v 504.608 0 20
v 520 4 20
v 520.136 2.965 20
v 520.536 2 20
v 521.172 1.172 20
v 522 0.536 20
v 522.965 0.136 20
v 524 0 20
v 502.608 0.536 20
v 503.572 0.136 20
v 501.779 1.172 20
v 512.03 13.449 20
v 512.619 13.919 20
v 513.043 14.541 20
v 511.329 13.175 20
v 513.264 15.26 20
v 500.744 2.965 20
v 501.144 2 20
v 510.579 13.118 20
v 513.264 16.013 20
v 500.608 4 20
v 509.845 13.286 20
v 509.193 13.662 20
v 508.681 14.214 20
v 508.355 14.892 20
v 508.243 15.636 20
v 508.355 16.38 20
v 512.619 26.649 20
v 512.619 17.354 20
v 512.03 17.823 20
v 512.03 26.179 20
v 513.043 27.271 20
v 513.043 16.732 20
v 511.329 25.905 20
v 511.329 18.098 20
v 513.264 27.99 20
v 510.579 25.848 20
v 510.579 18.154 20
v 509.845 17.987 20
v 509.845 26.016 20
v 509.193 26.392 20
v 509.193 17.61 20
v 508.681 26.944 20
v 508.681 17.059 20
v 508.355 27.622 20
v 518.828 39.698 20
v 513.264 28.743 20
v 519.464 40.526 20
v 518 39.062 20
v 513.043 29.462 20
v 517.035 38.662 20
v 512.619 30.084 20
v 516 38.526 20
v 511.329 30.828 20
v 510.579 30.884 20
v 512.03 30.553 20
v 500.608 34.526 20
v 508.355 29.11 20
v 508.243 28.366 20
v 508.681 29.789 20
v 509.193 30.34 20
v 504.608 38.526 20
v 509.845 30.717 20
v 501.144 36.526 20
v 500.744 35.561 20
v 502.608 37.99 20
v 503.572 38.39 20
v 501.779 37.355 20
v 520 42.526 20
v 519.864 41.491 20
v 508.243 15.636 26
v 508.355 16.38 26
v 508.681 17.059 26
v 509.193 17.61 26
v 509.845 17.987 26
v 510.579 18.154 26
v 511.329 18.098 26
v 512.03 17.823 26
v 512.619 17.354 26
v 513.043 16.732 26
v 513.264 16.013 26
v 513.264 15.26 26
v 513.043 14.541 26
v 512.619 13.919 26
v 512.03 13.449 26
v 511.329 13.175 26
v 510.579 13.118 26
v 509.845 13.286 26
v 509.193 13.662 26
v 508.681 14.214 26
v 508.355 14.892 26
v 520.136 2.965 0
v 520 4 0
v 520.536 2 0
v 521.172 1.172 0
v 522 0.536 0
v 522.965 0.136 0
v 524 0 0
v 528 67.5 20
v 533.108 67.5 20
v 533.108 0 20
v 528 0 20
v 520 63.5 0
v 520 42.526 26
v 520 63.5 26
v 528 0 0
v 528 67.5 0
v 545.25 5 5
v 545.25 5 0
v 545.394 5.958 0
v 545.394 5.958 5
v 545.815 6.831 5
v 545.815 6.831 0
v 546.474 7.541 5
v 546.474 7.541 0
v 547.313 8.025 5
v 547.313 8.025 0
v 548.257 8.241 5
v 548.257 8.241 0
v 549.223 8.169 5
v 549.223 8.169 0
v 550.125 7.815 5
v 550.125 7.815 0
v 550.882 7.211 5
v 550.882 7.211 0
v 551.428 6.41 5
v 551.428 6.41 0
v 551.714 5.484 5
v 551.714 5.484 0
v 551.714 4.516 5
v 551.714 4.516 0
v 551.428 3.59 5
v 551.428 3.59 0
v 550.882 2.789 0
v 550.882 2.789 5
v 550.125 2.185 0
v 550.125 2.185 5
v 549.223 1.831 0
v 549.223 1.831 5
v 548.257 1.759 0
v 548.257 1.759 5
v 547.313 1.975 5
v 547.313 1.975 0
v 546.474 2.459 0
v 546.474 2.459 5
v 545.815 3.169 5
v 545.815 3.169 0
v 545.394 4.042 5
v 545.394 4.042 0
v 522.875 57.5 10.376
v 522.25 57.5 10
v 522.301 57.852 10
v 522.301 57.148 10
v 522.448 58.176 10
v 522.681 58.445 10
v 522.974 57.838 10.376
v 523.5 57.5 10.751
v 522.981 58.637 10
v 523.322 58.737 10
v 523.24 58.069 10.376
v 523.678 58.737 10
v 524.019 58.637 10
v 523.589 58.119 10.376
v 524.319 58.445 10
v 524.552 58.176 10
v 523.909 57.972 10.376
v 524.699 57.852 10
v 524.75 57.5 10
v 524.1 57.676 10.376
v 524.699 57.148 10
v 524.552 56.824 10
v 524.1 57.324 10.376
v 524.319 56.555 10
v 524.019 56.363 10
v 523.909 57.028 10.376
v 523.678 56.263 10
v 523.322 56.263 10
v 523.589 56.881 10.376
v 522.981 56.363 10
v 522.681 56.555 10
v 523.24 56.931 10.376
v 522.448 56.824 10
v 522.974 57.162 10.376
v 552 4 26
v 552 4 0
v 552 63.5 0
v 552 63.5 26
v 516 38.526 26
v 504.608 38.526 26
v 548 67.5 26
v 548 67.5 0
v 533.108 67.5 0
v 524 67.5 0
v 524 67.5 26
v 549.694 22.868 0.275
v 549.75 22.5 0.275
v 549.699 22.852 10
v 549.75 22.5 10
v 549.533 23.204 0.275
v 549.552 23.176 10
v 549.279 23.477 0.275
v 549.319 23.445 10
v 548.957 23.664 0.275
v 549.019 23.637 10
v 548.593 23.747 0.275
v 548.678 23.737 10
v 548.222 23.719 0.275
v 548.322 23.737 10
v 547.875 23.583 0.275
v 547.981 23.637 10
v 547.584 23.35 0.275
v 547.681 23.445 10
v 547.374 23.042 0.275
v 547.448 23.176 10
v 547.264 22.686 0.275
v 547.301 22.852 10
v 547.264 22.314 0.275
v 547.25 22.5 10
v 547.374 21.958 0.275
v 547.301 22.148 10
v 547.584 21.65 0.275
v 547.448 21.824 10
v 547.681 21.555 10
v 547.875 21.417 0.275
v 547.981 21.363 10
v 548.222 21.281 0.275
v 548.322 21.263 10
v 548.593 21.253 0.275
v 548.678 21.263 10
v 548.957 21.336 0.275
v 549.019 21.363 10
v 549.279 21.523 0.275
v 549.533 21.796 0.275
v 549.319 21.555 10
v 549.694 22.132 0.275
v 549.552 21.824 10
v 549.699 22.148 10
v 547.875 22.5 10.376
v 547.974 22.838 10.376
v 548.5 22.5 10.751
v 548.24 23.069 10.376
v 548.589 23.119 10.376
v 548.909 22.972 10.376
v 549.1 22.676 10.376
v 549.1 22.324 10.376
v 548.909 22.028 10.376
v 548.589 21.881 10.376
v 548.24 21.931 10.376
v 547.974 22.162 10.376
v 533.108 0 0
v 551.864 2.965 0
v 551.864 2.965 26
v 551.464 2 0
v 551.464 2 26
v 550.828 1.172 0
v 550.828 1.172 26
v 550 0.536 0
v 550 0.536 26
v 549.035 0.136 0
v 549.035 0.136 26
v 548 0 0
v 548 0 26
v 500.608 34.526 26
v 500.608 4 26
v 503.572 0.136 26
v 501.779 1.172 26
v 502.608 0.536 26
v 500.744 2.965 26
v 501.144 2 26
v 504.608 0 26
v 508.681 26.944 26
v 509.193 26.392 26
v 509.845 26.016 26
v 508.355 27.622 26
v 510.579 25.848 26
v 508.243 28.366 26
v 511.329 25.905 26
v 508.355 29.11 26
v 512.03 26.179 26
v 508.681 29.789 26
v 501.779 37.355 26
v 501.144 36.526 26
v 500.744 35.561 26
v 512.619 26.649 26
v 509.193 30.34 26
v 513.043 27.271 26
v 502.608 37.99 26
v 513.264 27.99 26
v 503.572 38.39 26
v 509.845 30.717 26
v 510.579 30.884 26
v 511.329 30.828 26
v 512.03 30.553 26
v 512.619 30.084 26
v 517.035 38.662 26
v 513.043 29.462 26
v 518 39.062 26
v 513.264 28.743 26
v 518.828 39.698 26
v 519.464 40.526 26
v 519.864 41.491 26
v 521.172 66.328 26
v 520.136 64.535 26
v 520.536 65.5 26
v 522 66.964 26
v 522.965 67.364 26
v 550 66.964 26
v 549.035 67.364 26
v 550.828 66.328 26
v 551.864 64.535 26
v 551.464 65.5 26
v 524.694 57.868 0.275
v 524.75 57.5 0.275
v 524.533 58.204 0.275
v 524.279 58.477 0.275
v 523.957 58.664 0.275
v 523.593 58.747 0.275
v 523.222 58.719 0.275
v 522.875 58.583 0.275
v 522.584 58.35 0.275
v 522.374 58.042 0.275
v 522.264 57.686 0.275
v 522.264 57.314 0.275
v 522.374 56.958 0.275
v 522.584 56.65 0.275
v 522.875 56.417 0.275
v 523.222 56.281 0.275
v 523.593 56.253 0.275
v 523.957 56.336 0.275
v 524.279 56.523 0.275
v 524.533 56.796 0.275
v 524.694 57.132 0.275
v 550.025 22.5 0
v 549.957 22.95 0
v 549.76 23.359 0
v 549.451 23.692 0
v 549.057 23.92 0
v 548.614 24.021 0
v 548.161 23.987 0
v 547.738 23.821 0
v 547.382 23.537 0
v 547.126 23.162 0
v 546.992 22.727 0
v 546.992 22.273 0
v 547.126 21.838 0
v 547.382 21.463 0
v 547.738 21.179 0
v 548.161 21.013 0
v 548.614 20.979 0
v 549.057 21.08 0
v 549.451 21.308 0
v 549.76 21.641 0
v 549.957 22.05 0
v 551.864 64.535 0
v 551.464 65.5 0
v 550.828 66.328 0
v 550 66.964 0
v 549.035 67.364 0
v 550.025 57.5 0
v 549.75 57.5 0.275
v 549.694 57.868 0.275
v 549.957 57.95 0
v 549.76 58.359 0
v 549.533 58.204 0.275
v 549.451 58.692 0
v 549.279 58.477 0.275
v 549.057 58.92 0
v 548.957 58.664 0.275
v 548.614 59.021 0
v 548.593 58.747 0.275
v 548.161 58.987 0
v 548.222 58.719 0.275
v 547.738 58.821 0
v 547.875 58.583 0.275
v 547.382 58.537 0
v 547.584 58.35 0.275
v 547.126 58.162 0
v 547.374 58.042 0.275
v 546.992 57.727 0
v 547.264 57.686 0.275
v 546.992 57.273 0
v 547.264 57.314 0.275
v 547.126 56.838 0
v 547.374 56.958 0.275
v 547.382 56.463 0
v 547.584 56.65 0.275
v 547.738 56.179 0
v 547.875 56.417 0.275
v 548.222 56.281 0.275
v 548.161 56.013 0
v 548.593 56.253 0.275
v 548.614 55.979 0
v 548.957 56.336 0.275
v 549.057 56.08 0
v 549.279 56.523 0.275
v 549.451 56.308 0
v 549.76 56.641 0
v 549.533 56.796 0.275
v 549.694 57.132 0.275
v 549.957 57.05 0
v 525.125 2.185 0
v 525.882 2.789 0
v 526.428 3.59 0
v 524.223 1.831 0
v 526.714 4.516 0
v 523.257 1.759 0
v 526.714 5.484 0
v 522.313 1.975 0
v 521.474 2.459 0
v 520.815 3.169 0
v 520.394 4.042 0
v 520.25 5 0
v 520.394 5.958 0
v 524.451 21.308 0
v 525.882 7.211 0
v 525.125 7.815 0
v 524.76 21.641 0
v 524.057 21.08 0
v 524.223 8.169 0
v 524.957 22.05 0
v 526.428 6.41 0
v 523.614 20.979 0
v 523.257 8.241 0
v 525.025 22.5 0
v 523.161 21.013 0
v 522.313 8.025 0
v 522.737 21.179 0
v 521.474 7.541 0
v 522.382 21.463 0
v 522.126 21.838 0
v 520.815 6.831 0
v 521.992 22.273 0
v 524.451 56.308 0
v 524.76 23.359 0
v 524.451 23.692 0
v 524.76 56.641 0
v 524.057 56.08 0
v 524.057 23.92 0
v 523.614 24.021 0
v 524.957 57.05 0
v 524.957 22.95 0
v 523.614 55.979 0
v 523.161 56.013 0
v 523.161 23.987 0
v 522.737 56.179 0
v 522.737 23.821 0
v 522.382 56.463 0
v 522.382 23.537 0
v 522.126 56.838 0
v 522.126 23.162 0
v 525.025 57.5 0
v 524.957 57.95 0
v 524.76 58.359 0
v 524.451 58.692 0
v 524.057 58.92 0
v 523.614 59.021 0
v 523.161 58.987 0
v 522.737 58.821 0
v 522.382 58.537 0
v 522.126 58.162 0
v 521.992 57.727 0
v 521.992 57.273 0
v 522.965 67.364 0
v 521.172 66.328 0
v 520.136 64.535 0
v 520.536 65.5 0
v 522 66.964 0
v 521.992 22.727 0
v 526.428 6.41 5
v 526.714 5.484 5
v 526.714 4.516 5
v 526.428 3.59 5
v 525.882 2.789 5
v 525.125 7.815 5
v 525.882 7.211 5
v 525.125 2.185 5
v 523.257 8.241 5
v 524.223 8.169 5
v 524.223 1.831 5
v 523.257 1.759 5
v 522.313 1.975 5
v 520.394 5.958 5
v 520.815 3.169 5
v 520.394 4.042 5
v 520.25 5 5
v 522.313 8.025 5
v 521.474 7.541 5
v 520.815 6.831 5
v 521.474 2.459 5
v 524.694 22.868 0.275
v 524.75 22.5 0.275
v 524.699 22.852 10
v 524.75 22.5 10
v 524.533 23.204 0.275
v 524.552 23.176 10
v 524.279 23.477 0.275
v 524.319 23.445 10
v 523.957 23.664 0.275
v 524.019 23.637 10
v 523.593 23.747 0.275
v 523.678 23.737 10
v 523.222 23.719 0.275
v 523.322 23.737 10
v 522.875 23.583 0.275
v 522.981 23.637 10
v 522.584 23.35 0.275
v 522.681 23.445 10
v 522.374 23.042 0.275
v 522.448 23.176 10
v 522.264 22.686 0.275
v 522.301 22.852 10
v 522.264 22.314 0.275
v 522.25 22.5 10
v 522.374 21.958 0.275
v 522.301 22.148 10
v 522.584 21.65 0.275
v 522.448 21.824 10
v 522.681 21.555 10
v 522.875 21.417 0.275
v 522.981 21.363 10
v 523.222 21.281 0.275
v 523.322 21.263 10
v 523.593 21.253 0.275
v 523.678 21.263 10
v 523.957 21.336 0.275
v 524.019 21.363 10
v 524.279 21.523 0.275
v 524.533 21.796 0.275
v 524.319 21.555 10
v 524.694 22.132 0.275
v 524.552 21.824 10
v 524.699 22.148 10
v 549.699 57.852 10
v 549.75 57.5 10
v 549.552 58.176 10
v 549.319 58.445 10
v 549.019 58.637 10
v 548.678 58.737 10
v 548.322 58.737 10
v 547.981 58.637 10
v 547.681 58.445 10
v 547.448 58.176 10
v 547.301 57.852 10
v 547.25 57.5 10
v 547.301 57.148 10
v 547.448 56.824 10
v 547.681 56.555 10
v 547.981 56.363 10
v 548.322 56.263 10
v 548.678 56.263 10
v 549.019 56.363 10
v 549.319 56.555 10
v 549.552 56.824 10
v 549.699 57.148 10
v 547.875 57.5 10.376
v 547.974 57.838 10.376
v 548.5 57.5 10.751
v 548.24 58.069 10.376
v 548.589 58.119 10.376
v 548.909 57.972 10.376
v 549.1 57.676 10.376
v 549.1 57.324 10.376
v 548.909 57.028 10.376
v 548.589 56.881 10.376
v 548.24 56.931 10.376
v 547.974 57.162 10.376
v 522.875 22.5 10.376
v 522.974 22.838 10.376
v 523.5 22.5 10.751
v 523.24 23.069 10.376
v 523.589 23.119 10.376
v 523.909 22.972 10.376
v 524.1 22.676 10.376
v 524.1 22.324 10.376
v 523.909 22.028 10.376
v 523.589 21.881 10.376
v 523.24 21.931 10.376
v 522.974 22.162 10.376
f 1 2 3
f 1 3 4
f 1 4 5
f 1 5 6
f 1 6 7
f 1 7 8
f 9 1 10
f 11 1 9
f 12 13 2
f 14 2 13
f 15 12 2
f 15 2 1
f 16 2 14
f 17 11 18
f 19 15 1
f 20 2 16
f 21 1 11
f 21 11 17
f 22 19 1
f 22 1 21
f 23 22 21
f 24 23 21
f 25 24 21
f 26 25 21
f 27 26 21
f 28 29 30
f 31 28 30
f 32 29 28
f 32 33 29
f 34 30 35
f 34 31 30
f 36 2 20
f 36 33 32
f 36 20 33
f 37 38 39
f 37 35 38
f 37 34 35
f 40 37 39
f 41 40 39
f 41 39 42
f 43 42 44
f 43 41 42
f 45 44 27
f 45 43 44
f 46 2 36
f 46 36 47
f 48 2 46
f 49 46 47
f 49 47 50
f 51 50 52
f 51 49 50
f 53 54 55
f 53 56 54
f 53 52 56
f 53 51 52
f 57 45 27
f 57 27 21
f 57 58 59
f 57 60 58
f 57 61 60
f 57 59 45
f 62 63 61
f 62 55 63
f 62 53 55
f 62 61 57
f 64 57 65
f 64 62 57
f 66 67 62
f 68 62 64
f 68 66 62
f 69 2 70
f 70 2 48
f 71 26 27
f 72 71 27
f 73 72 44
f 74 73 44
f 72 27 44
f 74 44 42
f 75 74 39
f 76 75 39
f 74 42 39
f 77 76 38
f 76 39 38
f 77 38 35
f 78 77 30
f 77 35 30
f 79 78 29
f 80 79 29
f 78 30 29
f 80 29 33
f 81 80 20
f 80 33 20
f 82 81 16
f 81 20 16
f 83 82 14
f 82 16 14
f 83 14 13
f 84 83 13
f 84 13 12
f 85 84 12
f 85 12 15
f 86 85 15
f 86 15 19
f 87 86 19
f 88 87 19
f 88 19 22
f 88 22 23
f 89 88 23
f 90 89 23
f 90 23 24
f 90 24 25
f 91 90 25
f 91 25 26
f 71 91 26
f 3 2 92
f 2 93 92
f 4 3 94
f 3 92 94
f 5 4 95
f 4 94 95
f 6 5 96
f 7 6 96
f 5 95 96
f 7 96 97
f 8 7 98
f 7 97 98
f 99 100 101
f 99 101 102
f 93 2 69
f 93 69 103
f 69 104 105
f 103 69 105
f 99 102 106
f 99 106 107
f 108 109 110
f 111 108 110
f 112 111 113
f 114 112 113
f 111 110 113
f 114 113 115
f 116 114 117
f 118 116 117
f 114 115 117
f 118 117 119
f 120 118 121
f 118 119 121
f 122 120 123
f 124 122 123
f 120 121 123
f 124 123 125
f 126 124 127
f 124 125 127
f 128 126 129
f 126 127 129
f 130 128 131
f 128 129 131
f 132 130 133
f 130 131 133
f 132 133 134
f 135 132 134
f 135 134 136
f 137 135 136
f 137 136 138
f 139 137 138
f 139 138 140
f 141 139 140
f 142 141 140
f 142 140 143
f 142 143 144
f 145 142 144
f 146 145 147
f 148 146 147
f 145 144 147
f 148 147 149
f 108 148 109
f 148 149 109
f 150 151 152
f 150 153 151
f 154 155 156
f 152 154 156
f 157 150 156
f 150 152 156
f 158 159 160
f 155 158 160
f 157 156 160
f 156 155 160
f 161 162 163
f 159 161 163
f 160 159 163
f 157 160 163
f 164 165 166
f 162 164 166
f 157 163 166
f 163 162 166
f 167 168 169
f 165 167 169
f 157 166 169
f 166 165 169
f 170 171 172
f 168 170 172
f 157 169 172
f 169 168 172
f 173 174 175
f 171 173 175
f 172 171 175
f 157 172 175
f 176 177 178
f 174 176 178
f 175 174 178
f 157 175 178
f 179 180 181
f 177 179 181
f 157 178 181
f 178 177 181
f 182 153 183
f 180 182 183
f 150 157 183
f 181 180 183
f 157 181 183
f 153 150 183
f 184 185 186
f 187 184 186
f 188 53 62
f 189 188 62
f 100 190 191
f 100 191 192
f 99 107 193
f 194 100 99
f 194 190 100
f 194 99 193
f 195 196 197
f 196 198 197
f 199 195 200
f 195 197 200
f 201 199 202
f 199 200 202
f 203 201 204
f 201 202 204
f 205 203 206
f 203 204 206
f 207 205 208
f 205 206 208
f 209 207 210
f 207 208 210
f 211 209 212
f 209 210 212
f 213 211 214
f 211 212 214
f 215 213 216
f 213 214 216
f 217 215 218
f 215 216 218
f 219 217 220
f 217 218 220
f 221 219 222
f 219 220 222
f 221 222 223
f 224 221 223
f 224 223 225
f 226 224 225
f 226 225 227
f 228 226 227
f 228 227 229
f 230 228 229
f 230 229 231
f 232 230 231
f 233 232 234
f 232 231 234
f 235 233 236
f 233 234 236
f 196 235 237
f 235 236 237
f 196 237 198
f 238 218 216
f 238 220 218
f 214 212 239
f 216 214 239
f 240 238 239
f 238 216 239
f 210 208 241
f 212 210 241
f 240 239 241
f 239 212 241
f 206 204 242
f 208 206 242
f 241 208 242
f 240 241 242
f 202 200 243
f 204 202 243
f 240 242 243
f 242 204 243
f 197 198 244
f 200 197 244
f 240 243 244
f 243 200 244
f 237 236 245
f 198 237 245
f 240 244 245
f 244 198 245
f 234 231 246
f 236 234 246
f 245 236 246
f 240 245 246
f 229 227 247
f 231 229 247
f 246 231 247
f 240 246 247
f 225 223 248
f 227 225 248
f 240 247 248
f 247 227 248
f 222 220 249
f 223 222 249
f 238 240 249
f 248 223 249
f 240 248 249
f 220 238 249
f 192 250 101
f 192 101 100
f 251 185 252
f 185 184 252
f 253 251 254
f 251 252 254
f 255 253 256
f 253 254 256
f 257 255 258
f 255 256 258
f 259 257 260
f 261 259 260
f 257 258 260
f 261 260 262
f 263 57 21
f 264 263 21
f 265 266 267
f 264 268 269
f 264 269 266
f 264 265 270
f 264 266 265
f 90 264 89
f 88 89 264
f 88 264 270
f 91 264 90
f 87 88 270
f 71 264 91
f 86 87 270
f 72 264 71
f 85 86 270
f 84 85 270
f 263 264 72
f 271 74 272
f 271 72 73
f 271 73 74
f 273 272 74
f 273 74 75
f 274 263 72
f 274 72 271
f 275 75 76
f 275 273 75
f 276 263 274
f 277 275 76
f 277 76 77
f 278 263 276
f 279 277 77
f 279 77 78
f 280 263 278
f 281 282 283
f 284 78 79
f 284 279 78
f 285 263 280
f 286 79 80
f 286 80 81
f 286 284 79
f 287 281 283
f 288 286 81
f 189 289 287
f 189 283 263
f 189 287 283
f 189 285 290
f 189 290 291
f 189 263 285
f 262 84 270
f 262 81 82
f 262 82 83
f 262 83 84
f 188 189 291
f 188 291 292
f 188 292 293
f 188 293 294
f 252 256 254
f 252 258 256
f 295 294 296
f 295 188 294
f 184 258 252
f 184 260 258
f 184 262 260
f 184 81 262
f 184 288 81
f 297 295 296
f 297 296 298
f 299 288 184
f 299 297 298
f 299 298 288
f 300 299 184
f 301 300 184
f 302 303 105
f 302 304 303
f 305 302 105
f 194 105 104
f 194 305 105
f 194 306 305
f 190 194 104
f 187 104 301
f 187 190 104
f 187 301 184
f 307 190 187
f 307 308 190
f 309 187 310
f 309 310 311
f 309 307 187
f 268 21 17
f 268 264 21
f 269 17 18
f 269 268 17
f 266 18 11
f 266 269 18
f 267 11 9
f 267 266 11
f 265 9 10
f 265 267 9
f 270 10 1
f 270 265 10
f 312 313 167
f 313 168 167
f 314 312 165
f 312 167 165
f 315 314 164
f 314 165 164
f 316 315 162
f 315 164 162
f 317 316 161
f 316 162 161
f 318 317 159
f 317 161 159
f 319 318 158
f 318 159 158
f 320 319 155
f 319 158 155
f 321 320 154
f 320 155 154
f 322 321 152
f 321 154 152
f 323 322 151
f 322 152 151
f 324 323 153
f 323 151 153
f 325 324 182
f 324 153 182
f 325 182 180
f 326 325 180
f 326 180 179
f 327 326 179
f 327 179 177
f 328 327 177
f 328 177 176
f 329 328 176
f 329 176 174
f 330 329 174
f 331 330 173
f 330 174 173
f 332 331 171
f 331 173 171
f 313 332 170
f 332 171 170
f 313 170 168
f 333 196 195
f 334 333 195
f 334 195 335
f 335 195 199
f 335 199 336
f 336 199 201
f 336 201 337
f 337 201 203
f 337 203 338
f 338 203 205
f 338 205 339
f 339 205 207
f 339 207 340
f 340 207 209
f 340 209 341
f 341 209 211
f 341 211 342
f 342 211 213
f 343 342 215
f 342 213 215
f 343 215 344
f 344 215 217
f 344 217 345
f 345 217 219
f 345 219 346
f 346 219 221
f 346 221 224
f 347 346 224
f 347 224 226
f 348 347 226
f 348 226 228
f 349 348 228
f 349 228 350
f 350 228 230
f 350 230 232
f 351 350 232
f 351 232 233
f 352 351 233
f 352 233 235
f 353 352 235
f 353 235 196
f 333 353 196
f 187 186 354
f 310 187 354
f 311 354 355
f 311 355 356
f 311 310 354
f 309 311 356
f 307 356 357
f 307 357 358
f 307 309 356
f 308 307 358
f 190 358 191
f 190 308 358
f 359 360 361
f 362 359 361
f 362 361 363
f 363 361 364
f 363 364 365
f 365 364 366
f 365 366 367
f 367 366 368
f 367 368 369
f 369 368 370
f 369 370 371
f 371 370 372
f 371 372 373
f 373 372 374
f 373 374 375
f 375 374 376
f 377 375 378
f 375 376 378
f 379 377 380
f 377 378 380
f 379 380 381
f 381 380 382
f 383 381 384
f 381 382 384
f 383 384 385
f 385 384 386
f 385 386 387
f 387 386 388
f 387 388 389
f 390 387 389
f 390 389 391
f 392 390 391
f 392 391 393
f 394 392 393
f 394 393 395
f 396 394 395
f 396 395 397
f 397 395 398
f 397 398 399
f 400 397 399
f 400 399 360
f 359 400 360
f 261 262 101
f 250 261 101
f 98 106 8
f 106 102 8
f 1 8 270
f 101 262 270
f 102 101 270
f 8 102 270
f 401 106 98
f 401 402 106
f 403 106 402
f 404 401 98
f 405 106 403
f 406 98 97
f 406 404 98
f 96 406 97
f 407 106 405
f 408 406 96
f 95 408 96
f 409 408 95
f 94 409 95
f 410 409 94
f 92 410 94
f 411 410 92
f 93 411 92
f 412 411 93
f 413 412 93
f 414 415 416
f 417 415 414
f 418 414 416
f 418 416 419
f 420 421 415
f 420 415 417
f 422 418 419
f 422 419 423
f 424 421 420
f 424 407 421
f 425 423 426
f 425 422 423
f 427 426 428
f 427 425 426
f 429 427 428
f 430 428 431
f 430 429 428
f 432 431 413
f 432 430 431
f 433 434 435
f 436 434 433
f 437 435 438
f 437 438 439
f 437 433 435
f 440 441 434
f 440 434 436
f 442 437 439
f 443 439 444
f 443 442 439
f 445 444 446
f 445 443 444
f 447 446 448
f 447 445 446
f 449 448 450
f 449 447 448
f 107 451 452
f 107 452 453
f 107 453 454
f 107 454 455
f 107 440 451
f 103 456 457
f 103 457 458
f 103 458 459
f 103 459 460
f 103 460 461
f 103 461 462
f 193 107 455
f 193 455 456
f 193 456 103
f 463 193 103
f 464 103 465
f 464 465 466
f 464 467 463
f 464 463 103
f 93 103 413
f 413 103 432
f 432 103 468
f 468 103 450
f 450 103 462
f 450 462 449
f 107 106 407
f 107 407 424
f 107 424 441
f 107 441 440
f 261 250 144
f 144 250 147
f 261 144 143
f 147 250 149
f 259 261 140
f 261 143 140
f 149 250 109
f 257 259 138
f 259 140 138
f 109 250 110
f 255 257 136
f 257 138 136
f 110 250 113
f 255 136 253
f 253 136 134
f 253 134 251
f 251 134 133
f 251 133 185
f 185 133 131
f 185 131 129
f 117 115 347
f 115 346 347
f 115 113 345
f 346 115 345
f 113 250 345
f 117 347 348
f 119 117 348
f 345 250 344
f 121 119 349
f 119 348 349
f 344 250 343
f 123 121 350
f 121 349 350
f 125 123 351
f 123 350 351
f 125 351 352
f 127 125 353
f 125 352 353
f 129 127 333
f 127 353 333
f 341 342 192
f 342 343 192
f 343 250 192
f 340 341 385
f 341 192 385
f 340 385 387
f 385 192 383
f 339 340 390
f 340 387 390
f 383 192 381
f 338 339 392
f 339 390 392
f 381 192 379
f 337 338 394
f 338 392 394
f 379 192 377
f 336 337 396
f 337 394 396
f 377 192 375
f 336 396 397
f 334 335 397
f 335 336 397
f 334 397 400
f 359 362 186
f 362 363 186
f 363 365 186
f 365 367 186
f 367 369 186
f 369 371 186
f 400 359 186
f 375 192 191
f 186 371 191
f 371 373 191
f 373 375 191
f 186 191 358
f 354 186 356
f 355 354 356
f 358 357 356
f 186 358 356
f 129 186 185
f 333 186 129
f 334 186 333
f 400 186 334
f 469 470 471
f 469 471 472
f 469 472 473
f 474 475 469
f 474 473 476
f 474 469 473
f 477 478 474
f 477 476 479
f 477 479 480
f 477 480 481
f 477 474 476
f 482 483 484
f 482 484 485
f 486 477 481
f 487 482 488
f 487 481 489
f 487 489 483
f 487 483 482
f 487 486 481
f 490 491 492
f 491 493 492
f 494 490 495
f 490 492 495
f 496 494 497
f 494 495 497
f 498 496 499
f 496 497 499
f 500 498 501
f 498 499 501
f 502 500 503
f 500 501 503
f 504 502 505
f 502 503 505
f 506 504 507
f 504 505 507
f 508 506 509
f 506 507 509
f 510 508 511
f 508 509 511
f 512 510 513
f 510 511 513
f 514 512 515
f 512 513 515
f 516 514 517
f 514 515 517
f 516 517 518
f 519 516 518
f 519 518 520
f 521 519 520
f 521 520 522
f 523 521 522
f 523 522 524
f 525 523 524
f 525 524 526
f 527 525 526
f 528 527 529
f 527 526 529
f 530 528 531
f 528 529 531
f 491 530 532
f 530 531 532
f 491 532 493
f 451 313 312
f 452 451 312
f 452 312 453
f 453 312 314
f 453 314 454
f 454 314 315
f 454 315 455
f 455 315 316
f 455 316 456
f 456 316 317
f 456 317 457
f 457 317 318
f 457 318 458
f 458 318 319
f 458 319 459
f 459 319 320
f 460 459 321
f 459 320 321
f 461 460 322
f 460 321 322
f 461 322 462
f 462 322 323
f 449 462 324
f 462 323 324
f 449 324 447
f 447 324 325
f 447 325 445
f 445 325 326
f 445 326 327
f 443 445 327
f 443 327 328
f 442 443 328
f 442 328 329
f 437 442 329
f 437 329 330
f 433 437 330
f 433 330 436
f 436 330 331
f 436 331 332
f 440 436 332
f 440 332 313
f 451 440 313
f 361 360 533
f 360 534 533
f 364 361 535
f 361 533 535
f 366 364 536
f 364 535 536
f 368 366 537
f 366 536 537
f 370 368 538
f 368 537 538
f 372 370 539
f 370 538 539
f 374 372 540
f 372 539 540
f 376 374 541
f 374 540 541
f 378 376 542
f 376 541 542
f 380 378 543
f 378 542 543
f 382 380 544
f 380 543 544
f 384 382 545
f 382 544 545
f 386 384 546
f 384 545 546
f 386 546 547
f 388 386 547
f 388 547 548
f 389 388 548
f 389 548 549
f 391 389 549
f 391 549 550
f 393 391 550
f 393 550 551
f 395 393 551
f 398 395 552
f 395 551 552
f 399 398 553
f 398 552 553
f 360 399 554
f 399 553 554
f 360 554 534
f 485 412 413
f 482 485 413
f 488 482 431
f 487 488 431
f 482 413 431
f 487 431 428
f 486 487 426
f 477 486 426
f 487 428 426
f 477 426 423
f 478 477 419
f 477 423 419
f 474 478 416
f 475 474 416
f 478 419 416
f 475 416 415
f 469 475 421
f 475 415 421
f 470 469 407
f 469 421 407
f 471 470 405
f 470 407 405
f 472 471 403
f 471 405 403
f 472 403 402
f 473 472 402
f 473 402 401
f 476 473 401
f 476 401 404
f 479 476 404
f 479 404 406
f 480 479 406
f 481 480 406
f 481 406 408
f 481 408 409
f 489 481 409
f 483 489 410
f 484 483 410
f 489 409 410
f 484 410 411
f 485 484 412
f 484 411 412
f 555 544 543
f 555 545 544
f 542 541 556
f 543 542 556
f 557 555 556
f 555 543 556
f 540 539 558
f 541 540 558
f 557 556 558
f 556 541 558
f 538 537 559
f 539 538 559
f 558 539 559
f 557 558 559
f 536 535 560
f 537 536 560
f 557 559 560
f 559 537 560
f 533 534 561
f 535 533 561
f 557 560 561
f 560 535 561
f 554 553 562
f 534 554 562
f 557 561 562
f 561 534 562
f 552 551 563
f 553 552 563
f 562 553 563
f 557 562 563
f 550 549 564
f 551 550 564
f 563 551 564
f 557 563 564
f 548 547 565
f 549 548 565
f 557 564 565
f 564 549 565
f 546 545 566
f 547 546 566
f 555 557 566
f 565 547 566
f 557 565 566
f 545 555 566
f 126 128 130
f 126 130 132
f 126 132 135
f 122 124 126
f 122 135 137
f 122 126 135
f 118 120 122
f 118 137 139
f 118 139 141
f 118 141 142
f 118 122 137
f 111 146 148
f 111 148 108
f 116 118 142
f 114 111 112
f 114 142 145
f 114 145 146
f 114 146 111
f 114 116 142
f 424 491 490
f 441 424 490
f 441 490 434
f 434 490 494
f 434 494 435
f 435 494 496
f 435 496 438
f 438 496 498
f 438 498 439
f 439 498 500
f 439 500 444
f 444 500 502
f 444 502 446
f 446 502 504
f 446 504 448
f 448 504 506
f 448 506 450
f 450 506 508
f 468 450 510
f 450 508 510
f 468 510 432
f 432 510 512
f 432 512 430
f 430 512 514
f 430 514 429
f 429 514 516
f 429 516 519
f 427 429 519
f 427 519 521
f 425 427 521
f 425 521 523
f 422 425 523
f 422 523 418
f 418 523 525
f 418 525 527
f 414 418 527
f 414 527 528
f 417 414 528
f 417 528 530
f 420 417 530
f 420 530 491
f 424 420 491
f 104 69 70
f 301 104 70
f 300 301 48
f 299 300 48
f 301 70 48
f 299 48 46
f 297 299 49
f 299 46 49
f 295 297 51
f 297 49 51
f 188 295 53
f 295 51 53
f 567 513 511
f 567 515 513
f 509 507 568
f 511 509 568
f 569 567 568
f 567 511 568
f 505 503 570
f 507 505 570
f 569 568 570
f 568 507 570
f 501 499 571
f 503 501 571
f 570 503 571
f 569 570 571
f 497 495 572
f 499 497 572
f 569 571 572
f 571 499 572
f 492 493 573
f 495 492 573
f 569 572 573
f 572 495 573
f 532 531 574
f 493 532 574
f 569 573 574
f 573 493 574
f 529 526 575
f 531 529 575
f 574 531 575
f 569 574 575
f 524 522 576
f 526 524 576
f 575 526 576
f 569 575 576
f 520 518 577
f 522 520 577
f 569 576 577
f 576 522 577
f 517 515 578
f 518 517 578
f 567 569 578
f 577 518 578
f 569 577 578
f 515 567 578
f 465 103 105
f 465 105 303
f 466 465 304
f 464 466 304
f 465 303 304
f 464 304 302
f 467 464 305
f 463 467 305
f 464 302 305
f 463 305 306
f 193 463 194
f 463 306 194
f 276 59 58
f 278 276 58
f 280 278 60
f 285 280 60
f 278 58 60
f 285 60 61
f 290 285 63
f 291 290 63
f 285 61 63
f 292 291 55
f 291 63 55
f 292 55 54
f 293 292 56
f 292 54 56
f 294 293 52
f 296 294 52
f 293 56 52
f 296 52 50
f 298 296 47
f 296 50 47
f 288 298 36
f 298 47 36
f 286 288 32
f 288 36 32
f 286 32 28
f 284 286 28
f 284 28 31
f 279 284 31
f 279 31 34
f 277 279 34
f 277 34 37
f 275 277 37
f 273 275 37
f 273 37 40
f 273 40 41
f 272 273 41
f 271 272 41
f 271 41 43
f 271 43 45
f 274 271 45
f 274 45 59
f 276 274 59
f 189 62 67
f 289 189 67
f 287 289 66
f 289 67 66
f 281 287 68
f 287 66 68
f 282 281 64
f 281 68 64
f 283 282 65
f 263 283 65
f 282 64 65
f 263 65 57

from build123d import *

# Parameters (mm, degrees)
BOSS_EXTRUDE1_DEPTH             = 26
SKETCH4_W                       = 32.5
SKETCH4_H                       = 67.5
CUT_EXTRUDE1_DEPTH              = 20
SKETCH5_R                       = 2.525
CUT_EXTRUDE2_DEPTH              = 557.471248134
SKETCH6_W                       = 8
SKETCH6_H                       = 67.5
BOSS_EXTRUDE2_DEPTH             = 20
FILLET3_R                       = 4
SKETCH9_R                       = 3.25
CUT_EXTRUDE3_DEPTH              = 5
M3X0_5_TAPPED_HOLE1_D           = 2.5
M3X0_5_TAPPED_HOLE1_DEPTH       = 10
M3X0_5_TAPPED_HOLE1_CSINK_D     = 3.05
M3X0_5_TAPPED_HOLE1_CSINK_ANGLE = 90
M3X0_5_TAPPED_HOLE1_TIP         = 0.751075774


with BuildPart() as part:
    # Sketch3 → Boss-Extrude1 (new body)
    with BuildSketch(Plane.XY):
        with BuildLine():
            Line((516, 38.526197832), (504.607604335, 38.526197832))
            ThreePointArc((504.607604335, 38.526197832), (501.779177211, 37.354624957), (500.607604335, 34.526197832))
            Line((500.607604335, 34.526197832), (500.607604335, 24))
            Line((500.607604335, 24), (500.607604335, 0))
            Line((500.607604335, 0), (516, 0))
            Line((516, 0), (552, 0))
            Line((552, 0), (552, 38.526197832))
            Line((552, 38.526197832), (552, 67.5))
            Line((552, 67.5), (520, 67.5))
            Line((520, 67.5), (520, 42.526197832))
            ThreePointArc((520, 42.526197832), (518.828427125, 39.697770708), (516, 38.526197832))
        make_face()
    extrude(amount=BOSS_EXTRUDE1_DEPTH)

    # Sketch4 → Cut-Extrude1 (cut)
    with BuildSketch(Plane(origin=(0, 0, 0), x_dir=(-1, 0, 0), z_dir=(0, 0, -1))):
        with Locations((-516.857604335, 33.75)):
            Rectangle(SKETCH4_W, SKETCH4_H)
    extrude(amount=-CUT_EXTRUDE1_DEPTH, mode=Mode.SUBTRACT)

    # Sketch5 → Cut-Extrude2 (cut, through all)
    with BuildSketch(Plane(origin=(0, 0, 20), x_dir=(-1, 0, 0), z_dir=(0, 0, -1))):
        with Locations((-510.767604335, 28.366197832)):
            Circle(SKETCH5_R)
        with Locations((-510.767604335, 15.636197832)):
            Circle(SKETCH5_R)
    extrude(amount=-CUT_EXTRUDE2_DEPTH, mode=Mode.SUBTRACT)

    # Sketch6 → Boss-Extrude2 (add)
    with BuildSketch(Plane(origin=(0, 0, 20), x_dir=(-1, 0, 0), z_dir=(0, 0, -1))):
        with Locations((-524, 33.75)):
            Rectangle(SKETCH6_W, SKETCH6_H)
    extrude(amount=BOSS_EXTRUDE2_DEPTH)

    # Fillet3
    fillet3_edges = [part.edges().sort_by_distance(p)[0] for p in [
        (520, 67.5, 13),
        (552, 67.5, 13),
        (552, 0, 13),
        (500.607604335, 0, 23),
        (520, 0, 10),
    ]]
    fillet(fillet3_edges, radius=FILLET3_R)

    # Sketch9 → Cut-Extrude3 (cut)
    with BuildSketch(Plane(origin=(0, 0, 0), x_dir=(-1, 0, 0), z_dir=(0, 0, -1))):
        with Locations((-523.5, 5)):
            Circle(SKETCH9_R)
        with Locations((-548.5, 5)):
            Circle(SKETCH9_R)
    extrude(amount=-CUT_EXTRUDE3_DEPTH, mode=Mode.SUBTRACT)

    # M3x0.5 Tapped Hole1
    with Locations(Plane(origin=(0, 0, 0), x_dir=(-1, 0, 0), z_dir=(0, 0, -1))):
        with Locations((-523.5, 57.5), (-548.5, 57.5), (-548.5, 22.5), (-523.5, 22.5)):
            CounterSinkHole(M3X0_5_TAPPED_HOLE1_D / 2, M3X0_5_TAPPED_HOLE1_CSINK_D / 2, depth=M3X0_5_TAPPED_HOLE1_DEPTH, counter_sink_angle=M3X0_5_TAPPED_HOLE1_CSINK_ANGLE)
            with Locations((0, 0, -(M3X0_5_TAPPED_HOLE1_DEPTH + M3X0_5_TAPPED_HOLE1_TIP / 2))):  # 118° drill point
                Cone(0, M3X0_5_TAPPED_HOLE1_D / 2, M3X0_5_TAPPED_HOLE1_TIP, mode=Mode.SUBTRACT)


solid = part.part
